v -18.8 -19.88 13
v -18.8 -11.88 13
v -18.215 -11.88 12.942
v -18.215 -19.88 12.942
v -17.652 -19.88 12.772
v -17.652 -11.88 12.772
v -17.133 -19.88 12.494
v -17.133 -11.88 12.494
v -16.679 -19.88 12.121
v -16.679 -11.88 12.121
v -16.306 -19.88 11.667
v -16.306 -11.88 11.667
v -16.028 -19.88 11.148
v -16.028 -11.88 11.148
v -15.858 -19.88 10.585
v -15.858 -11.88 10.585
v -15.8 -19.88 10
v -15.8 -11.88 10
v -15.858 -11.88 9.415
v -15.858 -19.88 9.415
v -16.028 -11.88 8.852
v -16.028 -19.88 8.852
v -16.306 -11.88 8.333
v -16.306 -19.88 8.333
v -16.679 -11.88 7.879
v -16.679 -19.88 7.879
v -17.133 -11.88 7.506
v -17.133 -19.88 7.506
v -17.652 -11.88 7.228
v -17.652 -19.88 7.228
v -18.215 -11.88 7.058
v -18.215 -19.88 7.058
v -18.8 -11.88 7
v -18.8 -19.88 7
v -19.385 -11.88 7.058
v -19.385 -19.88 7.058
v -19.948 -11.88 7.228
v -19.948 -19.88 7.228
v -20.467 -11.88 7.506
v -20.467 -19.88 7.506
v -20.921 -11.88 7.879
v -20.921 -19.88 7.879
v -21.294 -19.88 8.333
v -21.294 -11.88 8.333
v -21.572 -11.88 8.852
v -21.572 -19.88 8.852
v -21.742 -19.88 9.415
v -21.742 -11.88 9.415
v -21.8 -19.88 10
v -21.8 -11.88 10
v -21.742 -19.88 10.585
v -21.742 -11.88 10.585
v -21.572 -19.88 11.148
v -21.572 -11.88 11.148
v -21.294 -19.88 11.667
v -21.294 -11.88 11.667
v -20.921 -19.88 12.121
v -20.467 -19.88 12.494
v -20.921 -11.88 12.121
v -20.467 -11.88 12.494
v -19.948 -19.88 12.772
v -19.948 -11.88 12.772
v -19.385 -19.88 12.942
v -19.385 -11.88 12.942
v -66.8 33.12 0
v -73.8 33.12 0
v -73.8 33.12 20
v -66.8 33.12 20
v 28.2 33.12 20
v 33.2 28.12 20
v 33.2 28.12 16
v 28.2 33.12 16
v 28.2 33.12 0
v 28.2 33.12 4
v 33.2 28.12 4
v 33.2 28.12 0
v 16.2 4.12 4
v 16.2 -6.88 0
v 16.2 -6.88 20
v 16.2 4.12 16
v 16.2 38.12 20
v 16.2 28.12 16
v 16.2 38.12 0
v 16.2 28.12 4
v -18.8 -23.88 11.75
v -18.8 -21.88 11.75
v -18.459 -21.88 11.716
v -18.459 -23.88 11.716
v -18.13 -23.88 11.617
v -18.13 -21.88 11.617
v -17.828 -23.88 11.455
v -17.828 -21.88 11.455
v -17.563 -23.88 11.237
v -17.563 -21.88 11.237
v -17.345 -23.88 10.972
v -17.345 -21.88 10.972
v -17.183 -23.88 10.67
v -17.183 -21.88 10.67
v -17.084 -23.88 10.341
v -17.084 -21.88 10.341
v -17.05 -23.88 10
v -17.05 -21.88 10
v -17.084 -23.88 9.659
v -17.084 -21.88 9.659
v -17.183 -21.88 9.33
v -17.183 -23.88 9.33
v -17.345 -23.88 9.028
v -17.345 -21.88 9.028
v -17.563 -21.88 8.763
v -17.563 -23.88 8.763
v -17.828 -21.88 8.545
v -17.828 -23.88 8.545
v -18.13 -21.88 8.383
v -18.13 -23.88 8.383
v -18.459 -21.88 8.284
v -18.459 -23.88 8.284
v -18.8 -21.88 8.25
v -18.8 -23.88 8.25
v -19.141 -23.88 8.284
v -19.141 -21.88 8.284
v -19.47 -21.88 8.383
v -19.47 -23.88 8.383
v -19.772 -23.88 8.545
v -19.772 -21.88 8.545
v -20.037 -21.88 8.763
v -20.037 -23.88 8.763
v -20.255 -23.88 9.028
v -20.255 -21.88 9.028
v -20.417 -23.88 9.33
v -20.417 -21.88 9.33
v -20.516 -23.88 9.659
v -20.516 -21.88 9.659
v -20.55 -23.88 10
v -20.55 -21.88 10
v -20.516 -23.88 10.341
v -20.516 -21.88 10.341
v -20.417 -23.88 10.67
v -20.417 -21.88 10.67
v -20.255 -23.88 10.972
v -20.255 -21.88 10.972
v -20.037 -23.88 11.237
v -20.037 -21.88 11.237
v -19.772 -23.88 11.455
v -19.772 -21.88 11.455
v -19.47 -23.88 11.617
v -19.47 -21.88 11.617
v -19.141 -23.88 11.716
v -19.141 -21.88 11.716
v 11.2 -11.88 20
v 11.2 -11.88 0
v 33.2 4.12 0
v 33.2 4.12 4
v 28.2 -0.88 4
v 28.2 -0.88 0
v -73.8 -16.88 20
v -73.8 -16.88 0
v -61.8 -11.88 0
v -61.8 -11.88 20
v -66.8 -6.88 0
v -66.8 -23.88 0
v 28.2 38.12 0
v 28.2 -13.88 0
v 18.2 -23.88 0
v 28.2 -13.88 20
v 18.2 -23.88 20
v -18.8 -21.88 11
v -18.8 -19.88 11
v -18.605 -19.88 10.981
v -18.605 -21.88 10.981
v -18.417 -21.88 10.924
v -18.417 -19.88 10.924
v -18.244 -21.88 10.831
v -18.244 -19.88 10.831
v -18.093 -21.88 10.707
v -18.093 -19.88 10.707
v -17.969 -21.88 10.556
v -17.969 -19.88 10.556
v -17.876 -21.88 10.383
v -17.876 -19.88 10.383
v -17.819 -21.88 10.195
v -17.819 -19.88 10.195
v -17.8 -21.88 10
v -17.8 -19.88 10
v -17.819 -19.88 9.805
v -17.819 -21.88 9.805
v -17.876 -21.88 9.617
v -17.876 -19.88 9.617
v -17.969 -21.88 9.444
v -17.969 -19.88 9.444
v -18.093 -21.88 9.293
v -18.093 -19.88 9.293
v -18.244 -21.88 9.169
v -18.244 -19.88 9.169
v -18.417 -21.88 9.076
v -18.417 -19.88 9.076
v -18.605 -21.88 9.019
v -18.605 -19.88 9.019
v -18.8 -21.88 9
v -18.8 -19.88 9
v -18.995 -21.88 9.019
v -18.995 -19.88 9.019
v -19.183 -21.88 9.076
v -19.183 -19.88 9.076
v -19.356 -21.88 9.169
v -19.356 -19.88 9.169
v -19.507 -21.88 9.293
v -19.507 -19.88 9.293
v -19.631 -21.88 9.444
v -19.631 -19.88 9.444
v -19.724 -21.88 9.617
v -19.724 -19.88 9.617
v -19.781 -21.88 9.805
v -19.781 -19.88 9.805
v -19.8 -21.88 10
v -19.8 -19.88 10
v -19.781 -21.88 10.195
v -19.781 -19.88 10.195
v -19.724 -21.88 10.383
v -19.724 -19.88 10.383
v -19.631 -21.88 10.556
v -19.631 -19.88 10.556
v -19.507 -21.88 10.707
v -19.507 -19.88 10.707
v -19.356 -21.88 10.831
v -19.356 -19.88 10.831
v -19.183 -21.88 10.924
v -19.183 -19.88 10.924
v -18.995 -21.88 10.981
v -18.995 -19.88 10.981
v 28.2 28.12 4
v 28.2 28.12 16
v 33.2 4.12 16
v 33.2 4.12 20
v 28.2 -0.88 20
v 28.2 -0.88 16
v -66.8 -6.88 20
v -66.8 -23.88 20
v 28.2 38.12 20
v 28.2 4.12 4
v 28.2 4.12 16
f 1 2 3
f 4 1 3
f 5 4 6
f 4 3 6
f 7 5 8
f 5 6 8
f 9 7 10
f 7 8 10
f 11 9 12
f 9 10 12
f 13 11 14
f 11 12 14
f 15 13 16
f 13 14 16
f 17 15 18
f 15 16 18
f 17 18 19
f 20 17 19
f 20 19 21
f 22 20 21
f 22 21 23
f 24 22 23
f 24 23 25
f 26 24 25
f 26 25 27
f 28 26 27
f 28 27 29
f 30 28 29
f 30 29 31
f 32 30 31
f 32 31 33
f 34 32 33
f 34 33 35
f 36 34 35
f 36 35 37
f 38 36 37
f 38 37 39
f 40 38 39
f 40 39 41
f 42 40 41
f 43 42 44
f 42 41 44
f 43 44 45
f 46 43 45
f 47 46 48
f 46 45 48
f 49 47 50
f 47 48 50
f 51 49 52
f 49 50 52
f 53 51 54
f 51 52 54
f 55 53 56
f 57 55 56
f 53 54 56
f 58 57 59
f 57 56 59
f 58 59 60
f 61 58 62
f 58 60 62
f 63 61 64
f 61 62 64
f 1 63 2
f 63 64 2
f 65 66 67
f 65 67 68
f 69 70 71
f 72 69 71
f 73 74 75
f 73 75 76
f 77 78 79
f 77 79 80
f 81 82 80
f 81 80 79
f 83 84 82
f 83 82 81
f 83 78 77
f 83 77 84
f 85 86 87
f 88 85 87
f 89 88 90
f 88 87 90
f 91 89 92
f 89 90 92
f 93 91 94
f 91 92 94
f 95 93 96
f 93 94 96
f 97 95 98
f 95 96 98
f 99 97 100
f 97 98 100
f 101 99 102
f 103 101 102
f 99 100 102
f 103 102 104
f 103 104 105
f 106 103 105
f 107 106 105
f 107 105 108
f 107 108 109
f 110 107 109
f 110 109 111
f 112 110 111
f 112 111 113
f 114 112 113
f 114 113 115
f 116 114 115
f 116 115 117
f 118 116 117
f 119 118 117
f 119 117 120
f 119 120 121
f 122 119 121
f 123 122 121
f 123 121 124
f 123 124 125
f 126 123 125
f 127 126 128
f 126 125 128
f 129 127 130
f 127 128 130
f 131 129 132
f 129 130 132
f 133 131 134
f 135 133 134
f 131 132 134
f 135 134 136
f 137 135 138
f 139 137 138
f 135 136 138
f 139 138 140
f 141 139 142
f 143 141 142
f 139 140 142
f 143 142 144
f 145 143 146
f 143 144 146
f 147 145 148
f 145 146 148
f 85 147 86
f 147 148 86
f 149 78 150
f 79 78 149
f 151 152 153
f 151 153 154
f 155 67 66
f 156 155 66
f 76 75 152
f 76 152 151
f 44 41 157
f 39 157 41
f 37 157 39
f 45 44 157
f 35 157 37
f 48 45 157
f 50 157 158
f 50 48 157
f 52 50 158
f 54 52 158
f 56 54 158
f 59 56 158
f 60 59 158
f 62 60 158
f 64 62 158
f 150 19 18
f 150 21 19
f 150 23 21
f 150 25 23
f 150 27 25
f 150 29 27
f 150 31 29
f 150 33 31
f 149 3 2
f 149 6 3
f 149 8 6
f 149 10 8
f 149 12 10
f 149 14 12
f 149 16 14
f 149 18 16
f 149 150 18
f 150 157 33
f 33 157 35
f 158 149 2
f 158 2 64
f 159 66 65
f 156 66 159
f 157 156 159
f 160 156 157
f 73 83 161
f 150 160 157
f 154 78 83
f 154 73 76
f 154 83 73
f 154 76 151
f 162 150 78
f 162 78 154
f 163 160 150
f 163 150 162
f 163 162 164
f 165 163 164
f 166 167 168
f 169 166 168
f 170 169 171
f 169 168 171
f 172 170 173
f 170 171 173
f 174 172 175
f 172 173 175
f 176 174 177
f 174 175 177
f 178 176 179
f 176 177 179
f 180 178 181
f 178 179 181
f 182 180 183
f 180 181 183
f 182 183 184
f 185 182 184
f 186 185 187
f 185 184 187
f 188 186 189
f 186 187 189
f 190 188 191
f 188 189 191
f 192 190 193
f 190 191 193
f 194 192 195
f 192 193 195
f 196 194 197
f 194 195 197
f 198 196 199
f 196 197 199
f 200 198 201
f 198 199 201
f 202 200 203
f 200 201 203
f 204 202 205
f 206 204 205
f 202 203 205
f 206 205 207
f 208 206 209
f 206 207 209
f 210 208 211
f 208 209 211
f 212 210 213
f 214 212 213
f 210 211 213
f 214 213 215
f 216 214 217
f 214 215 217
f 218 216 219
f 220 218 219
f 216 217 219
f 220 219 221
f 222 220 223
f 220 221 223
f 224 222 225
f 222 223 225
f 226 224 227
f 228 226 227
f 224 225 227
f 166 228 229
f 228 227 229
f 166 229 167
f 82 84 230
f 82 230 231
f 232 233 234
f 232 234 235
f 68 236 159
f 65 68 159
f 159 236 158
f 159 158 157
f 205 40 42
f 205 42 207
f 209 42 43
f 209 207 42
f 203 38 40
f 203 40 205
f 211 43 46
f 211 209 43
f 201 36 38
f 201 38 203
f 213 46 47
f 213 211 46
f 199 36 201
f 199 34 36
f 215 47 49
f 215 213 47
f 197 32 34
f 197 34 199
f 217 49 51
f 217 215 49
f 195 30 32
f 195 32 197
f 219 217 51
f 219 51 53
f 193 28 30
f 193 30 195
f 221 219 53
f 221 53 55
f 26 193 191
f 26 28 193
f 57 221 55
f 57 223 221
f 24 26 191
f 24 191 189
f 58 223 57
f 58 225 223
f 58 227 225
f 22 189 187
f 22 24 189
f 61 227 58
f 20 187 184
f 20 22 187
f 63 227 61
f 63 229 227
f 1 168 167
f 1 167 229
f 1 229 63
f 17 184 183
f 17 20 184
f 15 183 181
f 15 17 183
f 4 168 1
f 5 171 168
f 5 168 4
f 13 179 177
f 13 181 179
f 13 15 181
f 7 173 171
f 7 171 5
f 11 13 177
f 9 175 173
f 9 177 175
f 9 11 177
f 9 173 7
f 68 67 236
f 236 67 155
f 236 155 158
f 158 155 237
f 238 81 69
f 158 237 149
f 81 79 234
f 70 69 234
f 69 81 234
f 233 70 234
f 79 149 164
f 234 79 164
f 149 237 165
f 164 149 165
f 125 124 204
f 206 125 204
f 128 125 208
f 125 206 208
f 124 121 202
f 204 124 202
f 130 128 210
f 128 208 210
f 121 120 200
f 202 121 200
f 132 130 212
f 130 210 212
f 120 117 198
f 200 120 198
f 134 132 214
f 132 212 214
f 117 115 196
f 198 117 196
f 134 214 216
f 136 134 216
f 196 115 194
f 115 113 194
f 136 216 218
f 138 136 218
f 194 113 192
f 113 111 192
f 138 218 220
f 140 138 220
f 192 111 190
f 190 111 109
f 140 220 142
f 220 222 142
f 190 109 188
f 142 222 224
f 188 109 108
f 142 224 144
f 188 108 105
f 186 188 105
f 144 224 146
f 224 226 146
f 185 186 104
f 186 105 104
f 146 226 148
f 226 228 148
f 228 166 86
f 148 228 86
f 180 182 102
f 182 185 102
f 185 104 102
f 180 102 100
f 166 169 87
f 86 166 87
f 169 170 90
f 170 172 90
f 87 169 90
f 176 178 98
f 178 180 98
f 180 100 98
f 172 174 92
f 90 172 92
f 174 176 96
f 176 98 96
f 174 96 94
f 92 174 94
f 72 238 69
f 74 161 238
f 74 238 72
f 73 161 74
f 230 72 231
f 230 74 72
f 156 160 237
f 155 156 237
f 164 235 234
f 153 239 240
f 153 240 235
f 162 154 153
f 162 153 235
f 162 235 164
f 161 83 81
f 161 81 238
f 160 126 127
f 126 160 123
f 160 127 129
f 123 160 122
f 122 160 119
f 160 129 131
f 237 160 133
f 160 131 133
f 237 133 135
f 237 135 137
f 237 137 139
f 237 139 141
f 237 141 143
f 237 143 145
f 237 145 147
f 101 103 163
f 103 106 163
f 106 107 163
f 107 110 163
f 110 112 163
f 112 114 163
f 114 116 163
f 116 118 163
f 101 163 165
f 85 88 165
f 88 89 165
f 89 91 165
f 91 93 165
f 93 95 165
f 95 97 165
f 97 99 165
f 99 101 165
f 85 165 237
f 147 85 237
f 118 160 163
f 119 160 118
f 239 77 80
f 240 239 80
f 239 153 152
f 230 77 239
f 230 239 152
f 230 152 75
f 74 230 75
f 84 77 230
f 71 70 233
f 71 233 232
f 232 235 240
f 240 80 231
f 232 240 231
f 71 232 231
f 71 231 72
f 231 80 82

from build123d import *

# Parameters (mm, degrees)
BOSS_EXTRUDE1_DEPTH = 20
CHAMFER1_SIZE       = 5
CHAMFER2_SIZE       = 10
SKETCH2_R           = 1.75
CUT_EXTRUDE1_DEPTH  = 20
SKETCH3_R           = 3
CUT_EXTRUDE2_DEPTH  = 10
BOSS_EXTRUDE2_START = 2
SKETCH4_R           = 3
BOSS_EXTRUDE2_DEPTH = 2
SKETCH5_R           = 1
CUT_EXTRUDE3_DEPTH  = 2
SKETCH6_W           = 12
SKETCH6_H           = 24
CUT_EXTRUDE4_DEPTH  = 12
SKETCH7_W           = 4
SKETCH7_H           = 24
BOSS_EXTRUDE3_DEPTH = 5
CHAMFER3_SIZE       = 5
SKETCH8_W           = 20
SKETCH8_H           = 12
BOSS_EXTRUDE4_DEPTH = 45
SKETCH9_W           = 7
SKETCH9_H           = 20
BOSS_EXTRUDE5_DEPTH = 45
CHAMFER4_SIZE       = 5
CHAMFER5_SIZE       = 7


with BuildPart() as part:
    # Sketch1 → Boss-Extrude1 (new body)
    with BuildSketch(Plane.XY):
        Polygon((16.2, 38.12), (28.2, 38.12), (28.2, -23.88), (-28.8, -23.88), (-28.8, -11.88), (16.2, -11.88), align=None)
    extrude(amount=BOSS_EXTRUDE1_DEPTH)

    # Chamfer1
    chamfer1_edges = [part.edges().sort_by_distance(p)[0] for p in [
        (16.2, -11.88, 10),
    ]]
    chamfer(chamfer1_edges, length=CHAMFER1_SIZE)

    # Chamfer2
    chamfer2_edges = [part.edges().sort_by_distance(p)[0] for p in [
        (28.2, -23.88, 10),
    ]]
    chamfer(chamfer2_edges, length=CHAMFER2_SIZE)

    # Sketch2 → Cut-Extrude1 (cut)
    with BuildSketch(Plane(origin=(0, -11.88, 0), x_dir=(1, 0, 0), z_dir=(0, 1, 0))):
        with Locations(Location((-18.8, -10, 0), (0, 0, 270))):
            Circle(SKETCH2_R)
    extrude(amount=-CUT_EXTRUDE1_DEPTH, mode=Mode.SUBTRACT)

    # Sketch3 → Cut-Extrude2 (cut)
    with BuildSketch(Plane(origin=(0, -11.88, 0), x_dir=(1, 0, 0), z_dir=(0, 1, 0))):
        with Locations(Location((-18.8, -10, 0), (0, 0, 270))):
            Circle(SKETCH3_R)
    extrude(amount=-CUT_EXTRUDE2_DEPTH, mode=Mode.SUBTRACT)

    # Sketch4 → Boss-Extrude2 (add)
    with BuildSketch(Plane(origin=(0, -21.88, 0), x_dir=(1, 0, 0), z_dir=(0, 1, 0)).offset(BOSS_EXTRUDE2_START)):
        with Locations(Location((-18.8, -10, 0), (0, 0, 270))):
            Circle(SKETCH4_R)
    extrude(amount=-BOSS_EXTRUDE2_DEPTH)

    # Sketch5 → Cut-Extrude3 (cut)
    with BuildSketch(Plane(origin=(0, -19.88, 0), x_dir=(1, 0, 0), z_dir=(0, 1, 0))):
        with Locations(Location((-18.8, -10, 0), (0, 0, 270))):
            Circle(SKETCH5_R)
    extrude(amount=-CUT_EXTRUDE3_DEPTH, mode=Mode.SUBTRACT)

    # Sketch6 → Cut-Extrude4 (cut)
    with BuildSketch(Plane.ZY.offset(-16.2)):
        with Locations((10, 16.12)):
            Rectangle(SKETCH6_W, SKETCH6_H)
    extrude(amount=-CUT_EXTRUDE4_DEPTH, mode=Mode.SUBTRACT)

    # Sketch7 → Boss-Extrude3 (add)
    with BuildSketch(Plane(origin=(28.2, 0, 0), x_dir=(0, 0, -1), z_dir=(1, 0, 0))):
        with Locations((-18, 16.12)):
            Rectangle(SKETCH7_W, SKETCH7_H)
        with Locations((-2, 16.12)):
            Rectangle(SKETCH7_W, SKETCH7_H)
    extrude(amount=BOSS_EXTRUDE3_DEPTH)

    # Chamfer3
    chamfer3_edges = [part.edges().sort_by_distance(p)[0] for p in [
        (28.2, 4.12, 18),
        (28.2, 4.12, 2),
        (28.2, 28.12, 18),
        (28.2, 28.12, 2),
    ]]
    chamfer(chamfer3_edges, length=CHAMFER3_SIZE - 0.0001)  # a hair under: the kernel refuses the full size

    # Sketch8 → Boss-Extrude4 (add)
    with BuildSketch(Plane.ZY.offset(28.8)):
        with Locations((10, -17.88)):
            Rectangle(SKETCH8_W, SKETCH8_H)
    extrude(amount=BOSS_EXTRUDE4_DEPTH)

    # Sketch9 → Boss-Extrude5 (add)
    with BuildSketch(Plane(origin=(0, -11.88, 0), x_dir=(1, 0, 0), z_dir=(0, 1, 0))):
        with Locations((-70.3, -10)):
            Rectangle(SKETCH9_W, SKETCH9_H)
    extrude(amount=BOSS_EXTRUDE5_DEPTH)

    # Chamfer4
    chamfer4_edges = [part.edges().sort_by_distance(p)[0] for p in [
        (-66.8, -11.88, 10),
    ]]
    chamfer(chamfer4_edges, length=CHAMFER4_SIZE)

    # Chamfer5
    chamfer5_edges = [part.edges().sort_by_distance(p)[0] for p in [
        (-73.8, -23.88, 10),
    ]]
    chamfer(chamfer5_edges, length=CHAMFER5_SIZE)


solid = part.part
